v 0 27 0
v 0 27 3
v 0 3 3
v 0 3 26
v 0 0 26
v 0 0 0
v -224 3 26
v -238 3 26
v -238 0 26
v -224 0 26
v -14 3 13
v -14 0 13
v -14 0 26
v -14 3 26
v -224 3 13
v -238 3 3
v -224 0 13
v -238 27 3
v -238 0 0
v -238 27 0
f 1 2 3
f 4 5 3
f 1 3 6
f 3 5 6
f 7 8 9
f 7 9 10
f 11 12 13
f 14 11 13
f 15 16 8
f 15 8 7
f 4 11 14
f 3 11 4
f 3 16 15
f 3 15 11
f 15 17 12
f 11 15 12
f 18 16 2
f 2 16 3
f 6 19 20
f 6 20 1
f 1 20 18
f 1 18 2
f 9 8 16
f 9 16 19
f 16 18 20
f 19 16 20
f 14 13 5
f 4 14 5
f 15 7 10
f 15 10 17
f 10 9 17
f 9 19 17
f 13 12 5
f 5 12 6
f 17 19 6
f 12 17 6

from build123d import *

# Parameters (mm, degrees)
SKETCH1_W           = 238
SKETCH1_H           = 13
BOSS_EXTRUDE1_DEPTH = 3
SKETCH2_W           = 238
SKETCH2_H           = 3
BOSS_EXTRUDE2_DEPTH = 24
SKETCH3_W           = 14
SKETCH3_H           = 26
BOSS_EXTRUDE3_DEPTH = 3
SKETCH5_W           = 14
SKETCH5_H           = 23
BOSS_EXTRUDE5_DEPTH = 3


with BuildPart() as part:
    # Sketch1 → Boss-Extrude1 (new body)
    with BuildSketch(Plane(origin=(0, 0, 0), x_dir=(1, 0, 0), z_dir=(0, 1, 0))):
        with Locations((-119, -6.5)):
            Rectangle(SKETCH1_W, SKETCH1_H)
    extrude(amount=BOSS_EXTRUDE1_DEPTH)

    # Sketch2 → Boss-Extrude2 (add)
    with BuildSketch(Plane(origin=(0, 3, 0), x_dir=(1, 0, 0), z_dir=(0, 1, 0))):
        with Locations((-119, -1.5)):
            Rectangle(SKETCH2_W, SKETCH2_H)
    extrude(amount=BOSS_EXTRUDE2_DEPTH)

    # Sketch3 → Boss-Extrude3 (add)
    with BuildSketch(Plane.XZ):
        with Locations((-7, 13)):
            Rectangle(SKETCH3_W, SKETCH3_H)
    extrude(amount=-BOSS_EXTRUDE3_DEPTH)

    # Sketch5 → Boss-Extrude5 (add)
    with BuildSketch(Plane(origin=(0, 3, 0), x_dir=(1, 0, 0), z_dir=(0, 1, 0))):
        with Locations((-231, -14.5)):
            Rectangle(SKETCH5_W, SKETCH5_H)
    extrude(amount=-BOSS_EXTRUDE5_DEPTH)


solid = part.part
